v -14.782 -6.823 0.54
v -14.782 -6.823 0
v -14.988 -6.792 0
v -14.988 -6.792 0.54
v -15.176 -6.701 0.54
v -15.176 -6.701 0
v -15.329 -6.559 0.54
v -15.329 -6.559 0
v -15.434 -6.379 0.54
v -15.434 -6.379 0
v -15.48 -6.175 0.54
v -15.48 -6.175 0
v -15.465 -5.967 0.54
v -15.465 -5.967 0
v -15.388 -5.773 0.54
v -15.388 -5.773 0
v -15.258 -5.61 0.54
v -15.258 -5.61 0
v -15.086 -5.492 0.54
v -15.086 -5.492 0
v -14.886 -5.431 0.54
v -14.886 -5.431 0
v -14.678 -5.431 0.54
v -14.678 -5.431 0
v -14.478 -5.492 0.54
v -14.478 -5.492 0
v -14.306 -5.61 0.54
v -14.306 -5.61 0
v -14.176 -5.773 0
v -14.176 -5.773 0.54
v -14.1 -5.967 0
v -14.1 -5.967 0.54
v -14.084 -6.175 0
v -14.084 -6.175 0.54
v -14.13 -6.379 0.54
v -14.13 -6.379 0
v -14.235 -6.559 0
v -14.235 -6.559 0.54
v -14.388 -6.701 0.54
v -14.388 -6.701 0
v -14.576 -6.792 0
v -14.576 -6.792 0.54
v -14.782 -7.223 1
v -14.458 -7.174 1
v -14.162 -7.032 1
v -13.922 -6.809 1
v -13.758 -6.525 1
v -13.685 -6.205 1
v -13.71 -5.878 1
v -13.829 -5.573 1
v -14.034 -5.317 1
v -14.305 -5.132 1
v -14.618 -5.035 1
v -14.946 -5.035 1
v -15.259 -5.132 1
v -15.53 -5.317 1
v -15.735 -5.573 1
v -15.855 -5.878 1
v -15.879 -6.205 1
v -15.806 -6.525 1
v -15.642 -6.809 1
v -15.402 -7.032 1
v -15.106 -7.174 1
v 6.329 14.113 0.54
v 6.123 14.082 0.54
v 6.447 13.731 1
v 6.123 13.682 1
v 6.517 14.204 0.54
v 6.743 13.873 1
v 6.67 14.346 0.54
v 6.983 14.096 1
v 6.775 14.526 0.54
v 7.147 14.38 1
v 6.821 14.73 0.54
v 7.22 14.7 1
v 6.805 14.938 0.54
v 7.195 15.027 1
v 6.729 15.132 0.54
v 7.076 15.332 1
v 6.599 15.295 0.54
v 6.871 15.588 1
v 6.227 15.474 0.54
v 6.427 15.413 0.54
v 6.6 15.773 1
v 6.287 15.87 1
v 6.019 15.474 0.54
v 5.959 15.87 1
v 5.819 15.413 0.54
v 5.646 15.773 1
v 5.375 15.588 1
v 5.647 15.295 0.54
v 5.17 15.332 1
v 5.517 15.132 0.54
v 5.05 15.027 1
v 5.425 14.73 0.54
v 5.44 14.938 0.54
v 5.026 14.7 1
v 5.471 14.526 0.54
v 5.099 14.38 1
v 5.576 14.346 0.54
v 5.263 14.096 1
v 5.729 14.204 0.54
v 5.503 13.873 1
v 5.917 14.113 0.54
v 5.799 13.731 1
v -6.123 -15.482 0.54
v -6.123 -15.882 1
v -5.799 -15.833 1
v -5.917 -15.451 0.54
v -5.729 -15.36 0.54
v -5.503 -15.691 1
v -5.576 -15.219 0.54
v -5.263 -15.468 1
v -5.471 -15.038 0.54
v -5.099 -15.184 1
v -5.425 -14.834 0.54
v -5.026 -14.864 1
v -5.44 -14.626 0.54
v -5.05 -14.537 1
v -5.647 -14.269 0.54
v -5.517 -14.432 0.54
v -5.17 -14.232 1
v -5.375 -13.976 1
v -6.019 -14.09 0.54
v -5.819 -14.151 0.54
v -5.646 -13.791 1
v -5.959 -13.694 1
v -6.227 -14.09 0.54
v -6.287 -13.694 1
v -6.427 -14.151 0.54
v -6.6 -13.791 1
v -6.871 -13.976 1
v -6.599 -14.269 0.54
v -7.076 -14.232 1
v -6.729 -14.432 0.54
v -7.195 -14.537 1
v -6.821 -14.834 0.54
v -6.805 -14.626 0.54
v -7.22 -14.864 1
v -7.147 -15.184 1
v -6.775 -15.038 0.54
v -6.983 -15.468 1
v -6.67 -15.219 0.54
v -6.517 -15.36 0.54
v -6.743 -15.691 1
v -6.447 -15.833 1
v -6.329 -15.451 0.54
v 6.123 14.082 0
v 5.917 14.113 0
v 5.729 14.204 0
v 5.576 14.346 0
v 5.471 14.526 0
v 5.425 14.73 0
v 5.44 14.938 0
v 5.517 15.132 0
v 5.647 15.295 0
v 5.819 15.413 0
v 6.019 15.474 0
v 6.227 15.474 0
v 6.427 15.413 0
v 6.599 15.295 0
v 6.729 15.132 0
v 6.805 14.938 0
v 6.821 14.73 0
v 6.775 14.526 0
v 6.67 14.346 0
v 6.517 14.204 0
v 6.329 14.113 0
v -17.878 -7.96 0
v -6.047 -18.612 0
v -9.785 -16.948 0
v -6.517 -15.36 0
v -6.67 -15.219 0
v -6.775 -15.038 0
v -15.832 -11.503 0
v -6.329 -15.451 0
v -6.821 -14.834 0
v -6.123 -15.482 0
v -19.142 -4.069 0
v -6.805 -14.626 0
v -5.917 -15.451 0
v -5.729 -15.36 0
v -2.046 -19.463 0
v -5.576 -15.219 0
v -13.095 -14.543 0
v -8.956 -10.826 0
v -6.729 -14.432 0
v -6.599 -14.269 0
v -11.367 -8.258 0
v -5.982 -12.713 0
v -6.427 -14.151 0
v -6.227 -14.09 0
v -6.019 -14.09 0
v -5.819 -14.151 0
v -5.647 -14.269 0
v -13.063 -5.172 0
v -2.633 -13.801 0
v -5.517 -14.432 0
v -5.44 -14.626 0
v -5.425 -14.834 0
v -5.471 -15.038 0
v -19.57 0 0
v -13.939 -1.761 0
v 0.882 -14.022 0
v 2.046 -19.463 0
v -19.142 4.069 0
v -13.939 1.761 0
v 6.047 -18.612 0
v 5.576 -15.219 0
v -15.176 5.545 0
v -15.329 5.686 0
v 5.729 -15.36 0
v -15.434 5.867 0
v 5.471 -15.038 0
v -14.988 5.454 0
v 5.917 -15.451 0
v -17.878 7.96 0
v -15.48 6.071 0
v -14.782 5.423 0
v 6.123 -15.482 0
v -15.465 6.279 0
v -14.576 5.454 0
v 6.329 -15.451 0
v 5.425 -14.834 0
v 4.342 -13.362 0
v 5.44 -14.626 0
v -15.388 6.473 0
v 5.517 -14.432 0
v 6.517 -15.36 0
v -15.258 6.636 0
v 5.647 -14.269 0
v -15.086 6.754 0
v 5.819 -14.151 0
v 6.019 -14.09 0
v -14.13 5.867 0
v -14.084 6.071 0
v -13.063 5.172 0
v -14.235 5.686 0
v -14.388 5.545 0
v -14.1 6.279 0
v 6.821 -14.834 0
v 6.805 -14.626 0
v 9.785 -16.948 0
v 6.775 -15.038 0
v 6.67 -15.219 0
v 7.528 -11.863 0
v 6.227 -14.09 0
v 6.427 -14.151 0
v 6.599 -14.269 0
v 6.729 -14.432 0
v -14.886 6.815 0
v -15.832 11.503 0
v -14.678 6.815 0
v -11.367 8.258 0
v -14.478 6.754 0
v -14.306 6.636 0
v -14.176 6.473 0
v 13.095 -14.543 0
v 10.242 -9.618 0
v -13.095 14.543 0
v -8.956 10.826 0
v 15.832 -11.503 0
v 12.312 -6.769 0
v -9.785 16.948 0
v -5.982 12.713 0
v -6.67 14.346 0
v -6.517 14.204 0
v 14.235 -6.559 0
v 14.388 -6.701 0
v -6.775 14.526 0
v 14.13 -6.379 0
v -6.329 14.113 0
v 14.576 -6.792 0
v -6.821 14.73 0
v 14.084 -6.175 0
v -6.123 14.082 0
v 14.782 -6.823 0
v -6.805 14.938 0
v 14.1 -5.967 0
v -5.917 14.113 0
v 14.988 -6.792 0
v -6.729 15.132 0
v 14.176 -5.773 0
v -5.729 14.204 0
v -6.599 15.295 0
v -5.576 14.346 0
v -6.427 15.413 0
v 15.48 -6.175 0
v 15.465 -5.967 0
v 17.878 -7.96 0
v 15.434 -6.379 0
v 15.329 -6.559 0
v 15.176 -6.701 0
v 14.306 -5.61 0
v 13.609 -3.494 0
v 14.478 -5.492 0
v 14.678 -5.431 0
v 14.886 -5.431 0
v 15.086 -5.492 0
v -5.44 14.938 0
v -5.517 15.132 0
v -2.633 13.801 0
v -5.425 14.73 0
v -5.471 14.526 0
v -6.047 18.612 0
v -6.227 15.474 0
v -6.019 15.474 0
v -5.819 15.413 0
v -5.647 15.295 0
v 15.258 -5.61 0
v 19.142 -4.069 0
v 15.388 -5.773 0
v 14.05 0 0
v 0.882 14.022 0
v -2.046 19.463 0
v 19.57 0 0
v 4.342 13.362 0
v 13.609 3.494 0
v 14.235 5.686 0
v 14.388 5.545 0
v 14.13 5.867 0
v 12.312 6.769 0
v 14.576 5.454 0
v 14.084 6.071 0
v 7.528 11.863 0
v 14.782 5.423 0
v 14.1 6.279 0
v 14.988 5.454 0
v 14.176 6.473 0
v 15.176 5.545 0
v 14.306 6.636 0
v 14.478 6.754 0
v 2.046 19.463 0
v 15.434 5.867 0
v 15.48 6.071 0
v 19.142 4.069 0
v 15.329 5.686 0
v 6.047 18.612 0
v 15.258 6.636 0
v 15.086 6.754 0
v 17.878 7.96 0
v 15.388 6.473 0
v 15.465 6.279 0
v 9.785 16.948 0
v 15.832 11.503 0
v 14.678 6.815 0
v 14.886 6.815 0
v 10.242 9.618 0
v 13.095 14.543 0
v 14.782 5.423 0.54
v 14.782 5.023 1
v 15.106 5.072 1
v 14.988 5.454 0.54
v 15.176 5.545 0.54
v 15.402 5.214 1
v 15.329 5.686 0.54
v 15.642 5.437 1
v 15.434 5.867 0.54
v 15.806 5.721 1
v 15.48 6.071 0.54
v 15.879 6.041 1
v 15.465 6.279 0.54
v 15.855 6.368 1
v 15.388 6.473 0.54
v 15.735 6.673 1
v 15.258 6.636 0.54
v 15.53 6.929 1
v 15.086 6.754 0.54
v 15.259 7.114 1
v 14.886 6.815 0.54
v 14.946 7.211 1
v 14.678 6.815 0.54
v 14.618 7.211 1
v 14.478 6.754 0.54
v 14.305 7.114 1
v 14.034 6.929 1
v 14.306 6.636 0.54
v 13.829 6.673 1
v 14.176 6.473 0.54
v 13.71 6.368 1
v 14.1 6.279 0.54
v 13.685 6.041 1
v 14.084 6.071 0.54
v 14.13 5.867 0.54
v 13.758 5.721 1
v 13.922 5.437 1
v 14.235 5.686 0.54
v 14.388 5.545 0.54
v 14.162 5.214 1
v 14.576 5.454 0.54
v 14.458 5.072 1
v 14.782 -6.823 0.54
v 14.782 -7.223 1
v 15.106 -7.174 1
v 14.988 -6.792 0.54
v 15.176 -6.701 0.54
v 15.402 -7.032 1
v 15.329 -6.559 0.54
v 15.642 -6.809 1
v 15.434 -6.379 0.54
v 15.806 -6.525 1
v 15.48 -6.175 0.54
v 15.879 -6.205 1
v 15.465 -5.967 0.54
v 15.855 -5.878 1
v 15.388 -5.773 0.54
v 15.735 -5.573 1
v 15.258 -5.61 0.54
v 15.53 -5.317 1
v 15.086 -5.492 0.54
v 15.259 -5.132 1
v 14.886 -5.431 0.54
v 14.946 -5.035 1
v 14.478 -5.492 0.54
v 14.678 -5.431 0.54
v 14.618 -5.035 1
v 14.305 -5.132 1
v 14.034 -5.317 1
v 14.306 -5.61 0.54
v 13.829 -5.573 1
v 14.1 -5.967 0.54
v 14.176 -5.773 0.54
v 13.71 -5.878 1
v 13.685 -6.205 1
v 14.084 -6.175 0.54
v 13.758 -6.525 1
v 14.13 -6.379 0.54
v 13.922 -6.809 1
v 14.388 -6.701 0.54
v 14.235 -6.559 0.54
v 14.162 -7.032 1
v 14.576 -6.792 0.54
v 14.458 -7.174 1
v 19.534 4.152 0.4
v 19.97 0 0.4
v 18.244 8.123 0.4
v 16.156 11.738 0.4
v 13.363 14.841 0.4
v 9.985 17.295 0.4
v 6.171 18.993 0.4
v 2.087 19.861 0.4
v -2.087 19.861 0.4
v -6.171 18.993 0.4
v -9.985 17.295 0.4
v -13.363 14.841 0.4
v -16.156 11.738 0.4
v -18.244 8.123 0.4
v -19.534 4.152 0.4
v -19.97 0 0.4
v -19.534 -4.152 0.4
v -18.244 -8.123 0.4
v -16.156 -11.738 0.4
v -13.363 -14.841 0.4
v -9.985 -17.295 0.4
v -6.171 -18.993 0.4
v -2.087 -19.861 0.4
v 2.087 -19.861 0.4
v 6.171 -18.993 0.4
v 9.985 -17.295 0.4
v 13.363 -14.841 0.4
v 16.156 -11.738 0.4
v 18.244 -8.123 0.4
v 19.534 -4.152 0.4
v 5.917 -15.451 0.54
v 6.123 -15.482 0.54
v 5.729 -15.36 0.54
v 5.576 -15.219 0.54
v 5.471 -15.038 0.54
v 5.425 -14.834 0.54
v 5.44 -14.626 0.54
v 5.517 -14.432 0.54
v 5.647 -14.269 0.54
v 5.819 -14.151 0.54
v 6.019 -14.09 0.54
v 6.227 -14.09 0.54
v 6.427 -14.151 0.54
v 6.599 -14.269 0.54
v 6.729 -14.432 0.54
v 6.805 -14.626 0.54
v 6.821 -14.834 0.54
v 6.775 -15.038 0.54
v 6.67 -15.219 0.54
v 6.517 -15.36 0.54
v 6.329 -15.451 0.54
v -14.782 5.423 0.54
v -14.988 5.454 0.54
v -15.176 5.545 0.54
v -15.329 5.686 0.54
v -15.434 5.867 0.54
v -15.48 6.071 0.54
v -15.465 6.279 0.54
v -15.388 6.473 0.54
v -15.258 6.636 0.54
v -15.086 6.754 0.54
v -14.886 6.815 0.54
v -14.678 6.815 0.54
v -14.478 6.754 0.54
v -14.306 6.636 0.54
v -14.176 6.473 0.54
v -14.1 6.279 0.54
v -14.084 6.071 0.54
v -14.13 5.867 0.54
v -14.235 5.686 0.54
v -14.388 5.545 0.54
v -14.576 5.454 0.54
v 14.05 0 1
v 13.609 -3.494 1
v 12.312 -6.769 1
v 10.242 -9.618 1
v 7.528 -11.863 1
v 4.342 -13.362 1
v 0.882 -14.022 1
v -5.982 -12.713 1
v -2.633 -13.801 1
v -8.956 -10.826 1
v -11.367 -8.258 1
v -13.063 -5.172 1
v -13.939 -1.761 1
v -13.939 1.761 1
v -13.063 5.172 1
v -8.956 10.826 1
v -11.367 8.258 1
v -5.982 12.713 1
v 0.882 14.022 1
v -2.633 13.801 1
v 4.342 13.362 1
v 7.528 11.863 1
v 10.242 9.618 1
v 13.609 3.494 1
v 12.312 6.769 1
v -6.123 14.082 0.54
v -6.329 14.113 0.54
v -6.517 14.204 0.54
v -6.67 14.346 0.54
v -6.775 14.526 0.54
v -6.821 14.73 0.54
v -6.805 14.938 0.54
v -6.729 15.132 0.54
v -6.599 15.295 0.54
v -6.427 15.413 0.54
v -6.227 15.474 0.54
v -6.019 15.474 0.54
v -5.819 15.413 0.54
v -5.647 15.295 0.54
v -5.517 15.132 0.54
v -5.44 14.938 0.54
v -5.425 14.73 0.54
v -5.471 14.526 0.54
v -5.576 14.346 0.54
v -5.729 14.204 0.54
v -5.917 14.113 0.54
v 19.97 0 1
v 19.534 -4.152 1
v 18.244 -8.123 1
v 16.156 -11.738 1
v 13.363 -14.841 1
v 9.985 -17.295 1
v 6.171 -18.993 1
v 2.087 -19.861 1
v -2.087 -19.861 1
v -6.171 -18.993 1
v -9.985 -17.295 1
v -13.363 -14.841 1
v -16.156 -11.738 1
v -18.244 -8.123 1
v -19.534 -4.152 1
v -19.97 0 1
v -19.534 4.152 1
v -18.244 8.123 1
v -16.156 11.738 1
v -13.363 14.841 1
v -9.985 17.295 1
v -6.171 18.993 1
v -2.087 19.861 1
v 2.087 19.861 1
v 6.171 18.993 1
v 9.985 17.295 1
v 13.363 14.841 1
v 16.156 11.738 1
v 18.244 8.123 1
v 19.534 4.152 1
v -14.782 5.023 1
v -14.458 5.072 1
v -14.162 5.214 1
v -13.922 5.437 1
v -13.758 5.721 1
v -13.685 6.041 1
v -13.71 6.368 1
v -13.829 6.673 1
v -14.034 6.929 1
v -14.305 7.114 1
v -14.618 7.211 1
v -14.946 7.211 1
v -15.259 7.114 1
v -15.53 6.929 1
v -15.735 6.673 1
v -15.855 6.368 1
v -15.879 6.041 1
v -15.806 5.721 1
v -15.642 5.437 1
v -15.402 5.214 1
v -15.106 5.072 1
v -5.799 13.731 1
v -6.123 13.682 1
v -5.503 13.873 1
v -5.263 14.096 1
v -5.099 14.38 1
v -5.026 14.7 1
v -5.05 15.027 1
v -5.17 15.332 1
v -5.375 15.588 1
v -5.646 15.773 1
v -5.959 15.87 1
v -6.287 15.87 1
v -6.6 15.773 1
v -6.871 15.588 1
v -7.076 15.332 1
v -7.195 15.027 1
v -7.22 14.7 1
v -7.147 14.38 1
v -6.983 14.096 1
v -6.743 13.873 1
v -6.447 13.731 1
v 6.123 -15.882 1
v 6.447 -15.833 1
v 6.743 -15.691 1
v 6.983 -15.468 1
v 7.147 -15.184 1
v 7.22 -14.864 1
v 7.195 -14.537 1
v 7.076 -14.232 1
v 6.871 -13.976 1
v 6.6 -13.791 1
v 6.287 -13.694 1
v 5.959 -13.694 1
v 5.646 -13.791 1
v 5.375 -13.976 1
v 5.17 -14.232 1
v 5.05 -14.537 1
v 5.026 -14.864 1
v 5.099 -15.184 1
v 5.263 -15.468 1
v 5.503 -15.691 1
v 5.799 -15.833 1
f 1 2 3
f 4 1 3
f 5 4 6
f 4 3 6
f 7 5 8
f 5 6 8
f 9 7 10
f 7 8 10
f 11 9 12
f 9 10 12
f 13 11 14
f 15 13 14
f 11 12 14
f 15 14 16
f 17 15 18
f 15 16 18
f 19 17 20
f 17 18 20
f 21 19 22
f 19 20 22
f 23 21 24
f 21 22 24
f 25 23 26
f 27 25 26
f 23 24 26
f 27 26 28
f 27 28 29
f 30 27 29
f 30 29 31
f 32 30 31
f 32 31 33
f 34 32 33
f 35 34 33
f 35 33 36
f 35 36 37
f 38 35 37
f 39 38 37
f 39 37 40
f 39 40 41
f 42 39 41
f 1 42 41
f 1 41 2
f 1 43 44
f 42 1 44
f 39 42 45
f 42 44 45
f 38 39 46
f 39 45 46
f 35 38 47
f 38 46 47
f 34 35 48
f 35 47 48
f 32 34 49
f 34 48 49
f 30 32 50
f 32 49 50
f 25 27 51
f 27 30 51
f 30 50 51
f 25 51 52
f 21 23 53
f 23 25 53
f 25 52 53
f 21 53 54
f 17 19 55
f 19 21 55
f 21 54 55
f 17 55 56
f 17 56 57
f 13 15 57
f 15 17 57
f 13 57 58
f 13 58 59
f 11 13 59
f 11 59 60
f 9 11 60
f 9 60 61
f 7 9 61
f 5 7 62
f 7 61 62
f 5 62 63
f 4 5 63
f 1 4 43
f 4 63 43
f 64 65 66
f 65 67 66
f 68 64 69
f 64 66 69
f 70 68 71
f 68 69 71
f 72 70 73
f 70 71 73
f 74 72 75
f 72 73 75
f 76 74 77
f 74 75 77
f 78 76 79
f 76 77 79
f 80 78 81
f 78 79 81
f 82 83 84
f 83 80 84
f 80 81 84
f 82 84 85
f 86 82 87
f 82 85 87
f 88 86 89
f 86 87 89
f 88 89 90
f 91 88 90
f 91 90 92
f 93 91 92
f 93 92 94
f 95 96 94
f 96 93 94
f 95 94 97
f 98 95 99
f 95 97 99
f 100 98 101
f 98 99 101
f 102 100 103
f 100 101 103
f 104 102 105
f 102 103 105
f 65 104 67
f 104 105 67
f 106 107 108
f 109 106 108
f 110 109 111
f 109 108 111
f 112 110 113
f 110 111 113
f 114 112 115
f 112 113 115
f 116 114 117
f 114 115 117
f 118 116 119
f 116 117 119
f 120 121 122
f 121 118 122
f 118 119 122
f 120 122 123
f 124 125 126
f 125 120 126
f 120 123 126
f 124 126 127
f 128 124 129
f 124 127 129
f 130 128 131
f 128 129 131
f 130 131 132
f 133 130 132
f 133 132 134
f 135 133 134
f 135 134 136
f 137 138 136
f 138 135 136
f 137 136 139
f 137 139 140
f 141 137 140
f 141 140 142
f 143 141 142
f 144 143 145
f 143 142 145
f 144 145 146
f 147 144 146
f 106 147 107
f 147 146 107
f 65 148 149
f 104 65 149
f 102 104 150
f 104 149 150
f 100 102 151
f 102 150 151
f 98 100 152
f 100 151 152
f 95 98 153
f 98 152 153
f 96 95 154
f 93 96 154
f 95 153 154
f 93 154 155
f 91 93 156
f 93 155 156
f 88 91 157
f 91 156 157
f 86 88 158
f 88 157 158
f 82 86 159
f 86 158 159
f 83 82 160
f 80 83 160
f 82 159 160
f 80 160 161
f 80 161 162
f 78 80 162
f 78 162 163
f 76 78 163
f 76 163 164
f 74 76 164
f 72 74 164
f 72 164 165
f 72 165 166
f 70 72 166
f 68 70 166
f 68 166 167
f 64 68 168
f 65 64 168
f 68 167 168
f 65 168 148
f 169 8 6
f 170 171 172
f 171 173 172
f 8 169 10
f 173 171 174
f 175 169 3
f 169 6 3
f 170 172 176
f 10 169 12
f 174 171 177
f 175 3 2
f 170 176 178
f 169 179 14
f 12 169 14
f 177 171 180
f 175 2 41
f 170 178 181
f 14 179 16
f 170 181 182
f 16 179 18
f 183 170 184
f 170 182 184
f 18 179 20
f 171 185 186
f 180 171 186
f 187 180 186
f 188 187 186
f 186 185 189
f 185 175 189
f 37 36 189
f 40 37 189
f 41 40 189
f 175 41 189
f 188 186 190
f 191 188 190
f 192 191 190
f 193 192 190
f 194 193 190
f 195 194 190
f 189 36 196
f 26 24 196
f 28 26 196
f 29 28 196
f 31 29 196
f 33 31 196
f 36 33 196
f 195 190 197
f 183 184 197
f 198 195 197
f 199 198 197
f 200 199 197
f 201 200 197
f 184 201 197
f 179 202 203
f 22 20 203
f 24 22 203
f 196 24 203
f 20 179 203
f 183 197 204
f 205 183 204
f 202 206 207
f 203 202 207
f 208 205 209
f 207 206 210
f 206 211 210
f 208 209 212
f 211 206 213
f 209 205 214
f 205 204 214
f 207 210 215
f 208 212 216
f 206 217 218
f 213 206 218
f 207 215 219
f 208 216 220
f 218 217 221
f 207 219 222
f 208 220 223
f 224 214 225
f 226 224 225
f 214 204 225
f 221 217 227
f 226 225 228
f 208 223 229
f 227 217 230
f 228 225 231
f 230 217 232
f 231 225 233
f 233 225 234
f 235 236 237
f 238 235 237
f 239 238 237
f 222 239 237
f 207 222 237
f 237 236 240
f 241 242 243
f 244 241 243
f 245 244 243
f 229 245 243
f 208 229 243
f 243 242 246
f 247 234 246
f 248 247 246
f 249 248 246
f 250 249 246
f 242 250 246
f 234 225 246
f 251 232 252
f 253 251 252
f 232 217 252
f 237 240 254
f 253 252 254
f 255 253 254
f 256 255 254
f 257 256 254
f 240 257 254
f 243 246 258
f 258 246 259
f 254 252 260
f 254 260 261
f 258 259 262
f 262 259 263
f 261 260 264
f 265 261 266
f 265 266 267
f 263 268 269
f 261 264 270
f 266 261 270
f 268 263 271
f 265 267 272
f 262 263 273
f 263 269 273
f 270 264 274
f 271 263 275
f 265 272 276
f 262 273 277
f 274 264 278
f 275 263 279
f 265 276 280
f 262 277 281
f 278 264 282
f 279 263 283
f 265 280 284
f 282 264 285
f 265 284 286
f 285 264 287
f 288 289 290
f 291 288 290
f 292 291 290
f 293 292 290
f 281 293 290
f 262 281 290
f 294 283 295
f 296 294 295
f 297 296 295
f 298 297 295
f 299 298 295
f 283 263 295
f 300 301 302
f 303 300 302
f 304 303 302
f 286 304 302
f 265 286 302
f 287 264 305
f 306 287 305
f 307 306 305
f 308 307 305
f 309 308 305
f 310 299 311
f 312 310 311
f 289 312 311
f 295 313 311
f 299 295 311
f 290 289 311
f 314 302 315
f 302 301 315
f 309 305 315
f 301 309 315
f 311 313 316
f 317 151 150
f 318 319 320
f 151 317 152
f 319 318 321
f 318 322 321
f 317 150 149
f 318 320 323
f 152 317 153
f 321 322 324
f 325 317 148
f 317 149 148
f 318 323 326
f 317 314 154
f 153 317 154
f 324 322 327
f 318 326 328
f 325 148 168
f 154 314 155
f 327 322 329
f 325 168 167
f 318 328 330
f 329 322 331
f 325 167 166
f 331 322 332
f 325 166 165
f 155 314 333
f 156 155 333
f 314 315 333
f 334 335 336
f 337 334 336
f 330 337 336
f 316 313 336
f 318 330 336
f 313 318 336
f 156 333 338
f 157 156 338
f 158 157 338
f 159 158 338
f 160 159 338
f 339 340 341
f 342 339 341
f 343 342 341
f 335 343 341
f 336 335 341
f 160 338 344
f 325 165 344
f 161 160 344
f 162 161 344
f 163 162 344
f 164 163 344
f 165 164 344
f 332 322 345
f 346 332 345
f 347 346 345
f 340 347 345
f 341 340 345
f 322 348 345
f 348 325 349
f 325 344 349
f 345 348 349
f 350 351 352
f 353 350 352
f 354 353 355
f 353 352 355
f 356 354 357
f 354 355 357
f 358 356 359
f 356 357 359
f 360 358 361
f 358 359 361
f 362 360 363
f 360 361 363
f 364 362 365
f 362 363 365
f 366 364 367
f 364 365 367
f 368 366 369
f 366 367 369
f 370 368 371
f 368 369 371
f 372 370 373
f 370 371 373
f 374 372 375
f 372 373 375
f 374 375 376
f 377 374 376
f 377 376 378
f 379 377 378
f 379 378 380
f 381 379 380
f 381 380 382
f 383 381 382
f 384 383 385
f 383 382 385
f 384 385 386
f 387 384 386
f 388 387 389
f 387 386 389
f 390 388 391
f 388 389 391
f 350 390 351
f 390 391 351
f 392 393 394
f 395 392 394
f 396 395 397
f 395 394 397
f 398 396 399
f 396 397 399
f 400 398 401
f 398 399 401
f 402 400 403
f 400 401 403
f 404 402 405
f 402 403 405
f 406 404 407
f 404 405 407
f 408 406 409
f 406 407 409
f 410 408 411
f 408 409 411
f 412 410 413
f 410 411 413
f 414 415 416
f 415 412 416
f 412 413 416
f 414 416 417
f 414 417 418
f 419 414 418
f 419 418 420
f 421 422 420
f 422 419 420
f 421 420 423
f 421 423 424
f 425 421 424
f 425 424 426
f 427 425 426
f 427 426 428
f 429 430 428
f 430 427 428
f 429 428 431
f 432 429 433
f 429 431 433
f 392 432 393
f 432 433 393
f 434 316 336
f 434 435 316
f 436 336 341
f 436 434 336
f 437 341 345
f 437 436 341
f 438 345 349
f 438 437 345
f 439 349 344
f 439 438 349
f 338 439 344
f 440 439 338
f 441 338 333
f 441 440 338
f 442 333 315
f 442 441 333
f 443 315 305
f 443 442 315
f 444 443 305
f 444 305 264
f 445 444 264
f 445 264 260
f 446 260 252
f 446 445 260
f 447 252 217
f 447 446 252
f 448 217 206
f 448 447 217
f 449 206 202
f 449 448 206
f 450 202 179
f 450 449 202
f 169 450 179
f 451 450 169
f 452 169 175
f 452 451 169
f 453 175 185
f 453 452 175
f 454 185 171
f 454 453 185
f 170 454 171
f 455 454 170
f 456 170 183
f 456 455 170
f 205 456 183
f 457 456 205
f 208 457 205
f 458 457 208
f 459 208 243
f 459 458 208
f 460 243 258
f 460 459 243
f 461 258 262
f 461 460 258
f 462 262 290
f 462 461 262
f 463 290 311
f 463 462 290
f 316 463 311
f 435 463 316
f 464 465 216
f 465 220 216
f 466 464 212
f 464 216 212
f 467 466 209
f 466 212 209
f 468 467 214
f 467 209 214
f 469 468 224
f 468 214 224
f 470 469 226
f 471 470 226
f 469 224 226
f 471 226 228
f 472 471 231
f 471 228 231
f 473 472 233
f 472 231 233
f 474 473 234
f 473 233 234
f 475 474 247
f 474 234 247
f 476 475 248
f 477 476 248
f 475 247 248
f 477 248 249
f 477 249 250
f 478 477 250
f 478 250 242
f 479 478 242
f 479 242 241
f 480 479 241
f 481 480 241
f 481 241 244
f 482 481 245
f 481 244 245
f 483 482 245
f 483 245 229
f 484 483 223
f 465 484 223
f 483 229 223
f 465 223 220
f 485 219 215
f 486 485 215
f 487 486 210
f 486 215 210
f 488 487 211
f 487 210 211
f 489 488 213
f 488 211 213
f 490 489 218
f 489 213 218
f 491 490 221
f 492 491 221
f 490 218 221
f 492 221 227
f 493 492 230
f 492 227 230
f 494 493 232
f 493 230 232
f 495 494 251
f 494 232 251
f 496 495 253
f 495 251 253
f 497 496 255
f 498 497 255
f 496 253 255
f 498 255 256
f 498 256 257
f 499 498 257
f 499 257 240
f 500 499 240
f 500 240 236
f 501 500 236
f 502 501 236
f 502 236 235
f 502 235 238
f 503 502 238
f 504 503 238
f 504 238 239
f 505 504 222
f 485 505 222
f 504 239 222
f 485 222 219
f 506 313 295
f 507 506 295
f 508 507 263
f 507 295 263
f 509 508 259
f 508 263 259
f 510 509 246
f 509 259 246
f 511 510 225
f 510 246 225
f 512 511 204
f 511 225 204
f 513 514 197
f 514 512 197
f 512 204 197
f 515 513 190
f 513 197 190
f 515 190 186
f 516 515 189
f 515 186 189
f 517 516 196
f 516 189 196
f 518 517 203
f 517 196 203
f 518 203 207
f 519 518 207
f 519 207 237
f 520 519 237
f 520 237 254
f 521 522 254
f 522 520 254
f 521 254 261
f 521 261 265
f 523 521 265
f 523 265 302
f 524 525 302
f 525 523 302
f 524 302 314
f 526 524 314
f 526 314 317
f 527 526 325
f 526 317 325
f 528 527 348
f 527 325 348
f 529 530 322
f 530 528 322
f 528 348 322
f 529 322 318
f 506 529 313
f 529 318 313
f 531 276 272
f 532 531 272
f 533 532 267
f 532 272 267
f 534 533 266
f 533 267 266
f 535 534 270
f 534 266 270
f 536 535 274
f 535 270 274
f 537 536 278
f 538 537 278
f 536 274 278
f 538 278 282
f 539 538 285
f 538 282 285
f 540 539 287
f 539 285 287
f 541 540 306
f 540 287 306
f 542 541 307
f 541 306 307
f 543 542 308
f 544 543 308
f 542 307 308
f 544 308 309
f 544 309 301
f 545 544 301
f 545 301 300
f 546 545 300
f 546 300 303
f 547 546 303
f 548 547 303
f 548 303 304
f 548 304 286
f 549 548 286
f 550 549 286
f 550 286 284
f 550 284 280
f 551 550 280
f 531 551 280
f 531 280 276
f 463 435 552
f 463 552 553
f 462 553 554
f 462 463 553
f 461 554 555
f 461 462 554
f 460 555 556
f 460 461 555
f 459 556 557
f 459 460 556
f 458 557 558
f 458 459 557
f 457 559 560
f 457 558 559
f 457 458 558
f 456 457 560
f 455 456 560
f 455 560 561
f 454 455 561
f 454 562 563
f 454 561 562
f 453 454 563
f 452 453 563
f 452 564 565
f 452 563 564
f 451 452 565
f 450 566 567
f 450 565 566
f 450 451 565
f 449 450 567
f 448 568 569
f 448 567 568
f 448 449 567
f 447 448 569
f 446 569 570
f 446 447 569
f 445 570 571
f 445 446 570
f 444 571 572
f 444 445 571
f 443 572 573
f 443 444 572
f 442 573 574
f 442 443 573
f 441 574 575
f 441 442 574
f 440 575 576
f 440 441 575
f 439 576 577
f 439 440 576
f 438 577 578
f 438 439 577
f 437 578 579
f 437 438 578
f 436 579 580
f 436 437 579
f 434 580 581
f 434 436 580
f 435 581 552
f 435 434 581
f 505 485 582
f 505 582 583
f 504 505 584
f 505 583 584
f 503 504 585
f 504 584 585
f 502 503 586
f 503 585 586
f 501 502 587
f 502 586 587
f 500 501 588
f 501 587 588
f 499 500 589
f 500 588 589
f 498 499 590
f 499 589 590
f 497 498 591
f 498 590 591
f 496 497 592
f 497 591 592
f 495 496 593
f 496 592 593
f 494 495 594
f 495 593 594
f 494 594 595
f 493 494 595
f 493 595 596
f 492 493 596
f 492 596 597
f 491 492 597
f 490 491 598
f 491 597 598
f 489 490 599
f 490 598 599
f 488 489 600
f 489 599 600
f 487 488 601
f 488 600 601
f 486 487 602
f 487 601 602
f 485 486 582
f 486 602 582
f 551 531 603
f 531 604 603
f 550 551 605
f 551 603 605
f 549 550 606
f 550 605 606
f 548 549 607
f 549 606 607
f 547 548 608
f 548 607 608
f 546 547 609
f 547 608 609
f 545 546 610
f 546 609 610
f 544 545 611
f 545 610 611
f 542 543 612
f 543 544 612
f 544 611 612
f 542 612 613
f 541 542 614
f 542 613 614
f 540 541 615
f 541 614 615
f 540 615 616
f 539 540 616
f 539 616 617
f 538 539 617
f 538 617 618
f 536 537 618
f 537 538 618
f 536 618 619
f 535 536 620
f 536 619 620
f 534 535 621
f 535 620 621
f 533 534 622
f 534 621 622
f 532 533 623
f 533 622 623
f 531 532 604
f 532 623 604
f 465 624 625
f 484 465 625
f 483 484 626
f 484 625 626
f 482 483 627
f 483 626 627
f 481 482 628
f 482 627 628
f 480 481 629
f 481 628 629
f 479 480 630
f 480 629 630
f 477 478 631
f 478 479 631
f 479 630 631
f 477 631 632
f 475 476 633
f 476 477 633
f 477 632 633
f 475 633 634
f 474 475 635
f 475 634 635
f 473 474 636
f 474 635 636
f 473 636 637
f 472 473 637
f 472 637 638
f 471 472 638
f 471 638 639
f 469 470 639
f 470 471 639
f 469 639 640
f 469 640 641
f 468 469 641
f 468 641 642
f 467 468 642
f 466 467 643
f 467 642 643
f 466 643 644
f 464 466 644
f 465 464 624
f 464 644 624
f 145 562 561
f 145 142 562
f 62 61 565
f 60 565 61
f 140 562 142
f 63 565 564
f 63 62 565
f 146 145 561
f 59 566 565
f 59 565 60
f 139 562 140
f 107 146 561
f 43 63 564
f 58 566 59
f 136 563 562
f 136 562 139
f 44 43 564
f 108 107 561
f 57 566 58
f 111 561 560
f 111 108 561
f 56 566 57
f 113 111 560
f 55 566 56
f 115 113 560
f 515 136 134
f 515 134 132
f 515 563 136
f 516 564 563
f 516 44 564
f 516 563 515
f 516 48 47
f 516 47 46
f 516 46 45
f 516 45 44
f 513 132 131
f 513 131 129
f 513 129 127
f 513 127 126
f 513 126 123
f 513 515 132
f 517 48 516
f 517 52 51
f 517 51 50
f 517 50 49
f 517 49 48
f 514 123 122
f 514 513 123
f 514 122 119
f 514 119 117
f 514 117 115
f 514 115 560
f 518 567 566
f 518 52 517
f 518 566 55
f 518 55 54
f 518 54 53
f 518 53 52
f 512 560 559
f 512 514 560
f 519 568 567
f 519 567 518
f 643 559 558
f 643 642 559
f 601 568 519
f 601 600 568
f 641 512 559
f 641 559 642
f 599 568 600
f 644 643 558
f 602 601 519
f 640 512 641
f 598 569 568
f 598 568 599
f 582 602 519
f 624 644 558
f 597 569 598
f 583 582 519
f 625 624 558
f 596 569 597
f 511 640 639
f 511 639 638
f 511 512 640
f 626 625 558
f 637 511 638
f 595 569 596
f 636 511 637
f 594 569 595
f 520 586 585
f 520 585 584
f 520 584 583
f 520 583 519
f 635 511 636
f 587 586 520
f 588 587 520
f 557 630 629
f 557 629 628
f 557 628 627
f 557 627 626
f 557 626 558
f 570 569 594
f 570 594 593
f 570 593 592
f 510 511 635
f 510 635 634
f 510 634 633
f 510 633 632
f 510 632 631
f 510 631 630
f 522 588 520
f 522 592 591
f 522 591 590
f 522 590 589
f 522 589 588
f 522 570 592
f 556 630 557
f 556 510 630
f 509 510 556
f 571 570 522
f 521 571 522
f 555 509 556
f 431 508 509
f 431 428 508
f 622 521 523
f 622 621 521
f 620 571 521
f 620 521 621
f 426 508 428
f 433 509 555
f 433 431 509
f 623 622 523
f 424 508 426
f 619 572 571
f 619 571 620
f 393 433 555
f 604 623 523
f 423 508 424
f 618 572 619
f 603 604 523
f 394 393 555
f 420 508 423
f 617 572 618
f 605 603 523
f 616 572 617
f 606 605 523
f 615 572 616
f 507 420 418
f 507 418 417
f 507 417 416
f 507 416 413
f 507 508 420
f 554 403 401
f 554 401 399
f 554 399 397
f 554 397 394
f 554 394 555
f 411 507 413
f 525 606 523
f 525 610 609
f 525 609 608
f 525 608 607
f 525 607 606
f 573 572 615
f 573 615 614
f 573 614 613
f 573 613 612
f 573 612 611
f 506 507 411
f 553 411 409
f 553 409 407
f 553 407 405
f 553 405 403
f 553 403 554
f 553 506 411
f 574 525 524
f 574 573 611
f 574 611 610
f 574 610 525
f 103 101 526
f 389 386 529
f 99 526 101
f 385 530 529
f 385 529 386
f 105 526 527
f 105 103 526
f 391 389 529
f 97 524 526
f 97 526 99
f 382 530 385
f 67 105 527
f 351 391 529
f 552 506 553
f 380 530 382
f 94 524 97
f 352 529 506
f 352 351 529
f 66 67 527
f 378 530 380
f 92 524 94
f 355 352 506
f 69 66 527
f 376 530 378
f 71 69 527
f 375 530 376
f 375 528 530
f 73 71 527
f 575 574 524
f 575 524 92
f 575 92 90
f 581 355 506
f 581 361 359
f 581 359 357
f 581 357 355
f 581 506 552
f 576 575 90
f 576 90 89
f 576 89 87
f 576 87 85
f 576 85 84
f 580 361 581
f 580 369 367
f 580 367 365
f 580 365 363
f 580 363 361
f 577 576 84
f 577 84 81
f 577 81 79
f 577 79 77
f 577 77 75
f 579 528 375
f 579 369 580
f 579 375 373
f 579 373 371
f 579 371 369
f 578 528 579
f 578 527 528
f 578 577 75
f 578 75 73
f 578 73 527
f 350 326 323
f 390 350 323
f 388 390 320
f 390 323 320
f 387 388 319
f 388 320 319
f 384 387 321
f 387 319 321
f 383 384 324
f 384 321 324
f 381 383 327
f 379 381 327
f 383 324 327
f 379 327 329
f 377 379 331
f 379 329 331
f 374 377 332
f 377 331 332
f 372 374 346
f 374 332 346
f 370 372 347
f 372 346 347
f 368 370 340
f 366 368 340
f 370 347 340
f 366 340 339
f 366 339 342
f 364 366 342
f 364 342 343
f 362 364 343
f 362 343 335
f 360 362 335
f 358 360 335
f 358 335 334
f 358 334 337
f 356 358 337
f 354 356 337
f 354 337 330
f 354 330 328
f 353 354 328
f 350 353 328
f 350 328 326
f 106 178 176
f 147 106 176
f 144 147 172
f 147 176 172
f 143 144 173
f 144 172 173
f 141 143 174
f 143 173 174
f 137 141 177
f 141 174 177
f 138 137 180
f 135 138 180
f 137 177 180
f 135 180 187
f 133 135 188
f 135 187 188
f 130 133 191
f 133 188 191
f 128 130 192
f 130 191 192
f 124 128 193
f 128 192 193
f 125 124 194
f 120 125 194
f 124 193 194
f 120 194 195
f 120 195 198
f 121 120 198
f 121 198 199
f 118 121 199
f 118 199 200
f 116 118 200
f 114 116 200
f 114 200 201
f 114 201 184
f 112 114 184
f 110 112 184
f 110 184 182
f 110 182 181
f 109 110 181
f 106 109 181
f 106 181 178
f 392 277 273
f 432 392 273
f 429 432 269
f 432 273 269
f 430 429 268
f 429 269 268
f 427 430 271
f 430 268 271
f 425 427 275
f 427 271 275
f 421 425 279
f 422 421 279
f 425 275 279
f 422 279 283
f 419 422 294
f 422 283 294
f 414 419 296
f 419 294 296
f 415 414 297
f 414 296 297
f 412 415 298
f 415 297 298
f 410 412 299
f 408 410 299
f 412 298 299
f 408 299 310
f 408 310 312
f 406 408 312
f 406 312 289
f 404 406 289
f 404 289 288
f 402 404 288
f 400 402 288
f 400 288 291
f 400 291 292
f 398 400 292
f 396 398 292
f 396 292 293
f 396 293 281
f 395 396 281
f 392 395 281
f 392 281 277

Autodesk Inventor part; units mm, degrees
ref_plane "YZ Plane" through (0, 0, 0) normal (1, 0, 0) x (0, 1, 0)
ref_plane "XZ Plane" through (0, 0, 0) normal (0, 1, 0) x (-1, 0, 0)
ref_plane "XY Plane" through (0, 0, 0) normal (0, 0, 1) x (1, 0, 0)
sketch "スケッチ1" plane through (0, 0, 0) normal (0, 0, 1) x (1, 0, 0)
  circle A0 centre (0, 0) radius 14.05
  circle A1 centre (0, 0) radius 19.97 projected
  circle A2 centre (0, 0) radius 14 construction
  point P0 (0, 0)
  dimension "d2" = 0.05
extrude "押し出し1" add sketch "スケッチ1" along normal blind 1
chamfer "面取り1" distance 0.4 angle 45 1 edges at (-19.97, 0, 0)
sketch "スケッチ2" plane through (0, 0, 1) normal (0, 0, 1) x (1, 0, 0)
  circle A0 centre (6.1229, -14.7821) radius 0.5915 construction
  point P0 (0, 0)
  point P1 (14.7821, -6.1229)
  point P2 (14.7821, 6.1229)
  point P3 (6.1229, 14.7821)
  point P4 (-6.1229, 14.7821)
  point P5 (-14.7821, 6.1229)
  point P6 (-14.7821, -6.1229)
  point P7 (-6.1229, -14.7821)
  dimension "d8" = 360
hole "穴1" at (6.1229, -14.7821, 1) at (14.7821, -6.1229, 1) at (14.7821, 6.1229, 1) at (6.1229, 14.7821, 1) at (-6.1229, 14.7821, 1) at (-14.7821, 6.1229, 1) at (-14.7821, -6.1229, 1) at (-6.1229, -14.7821, 1) direction (0, 0, -1) diameter 1.4 end through all countersink diameter 2.2 countersink angle 82
properties part number "UPPER_TIMING_PULLEY_COVER_INNER"
